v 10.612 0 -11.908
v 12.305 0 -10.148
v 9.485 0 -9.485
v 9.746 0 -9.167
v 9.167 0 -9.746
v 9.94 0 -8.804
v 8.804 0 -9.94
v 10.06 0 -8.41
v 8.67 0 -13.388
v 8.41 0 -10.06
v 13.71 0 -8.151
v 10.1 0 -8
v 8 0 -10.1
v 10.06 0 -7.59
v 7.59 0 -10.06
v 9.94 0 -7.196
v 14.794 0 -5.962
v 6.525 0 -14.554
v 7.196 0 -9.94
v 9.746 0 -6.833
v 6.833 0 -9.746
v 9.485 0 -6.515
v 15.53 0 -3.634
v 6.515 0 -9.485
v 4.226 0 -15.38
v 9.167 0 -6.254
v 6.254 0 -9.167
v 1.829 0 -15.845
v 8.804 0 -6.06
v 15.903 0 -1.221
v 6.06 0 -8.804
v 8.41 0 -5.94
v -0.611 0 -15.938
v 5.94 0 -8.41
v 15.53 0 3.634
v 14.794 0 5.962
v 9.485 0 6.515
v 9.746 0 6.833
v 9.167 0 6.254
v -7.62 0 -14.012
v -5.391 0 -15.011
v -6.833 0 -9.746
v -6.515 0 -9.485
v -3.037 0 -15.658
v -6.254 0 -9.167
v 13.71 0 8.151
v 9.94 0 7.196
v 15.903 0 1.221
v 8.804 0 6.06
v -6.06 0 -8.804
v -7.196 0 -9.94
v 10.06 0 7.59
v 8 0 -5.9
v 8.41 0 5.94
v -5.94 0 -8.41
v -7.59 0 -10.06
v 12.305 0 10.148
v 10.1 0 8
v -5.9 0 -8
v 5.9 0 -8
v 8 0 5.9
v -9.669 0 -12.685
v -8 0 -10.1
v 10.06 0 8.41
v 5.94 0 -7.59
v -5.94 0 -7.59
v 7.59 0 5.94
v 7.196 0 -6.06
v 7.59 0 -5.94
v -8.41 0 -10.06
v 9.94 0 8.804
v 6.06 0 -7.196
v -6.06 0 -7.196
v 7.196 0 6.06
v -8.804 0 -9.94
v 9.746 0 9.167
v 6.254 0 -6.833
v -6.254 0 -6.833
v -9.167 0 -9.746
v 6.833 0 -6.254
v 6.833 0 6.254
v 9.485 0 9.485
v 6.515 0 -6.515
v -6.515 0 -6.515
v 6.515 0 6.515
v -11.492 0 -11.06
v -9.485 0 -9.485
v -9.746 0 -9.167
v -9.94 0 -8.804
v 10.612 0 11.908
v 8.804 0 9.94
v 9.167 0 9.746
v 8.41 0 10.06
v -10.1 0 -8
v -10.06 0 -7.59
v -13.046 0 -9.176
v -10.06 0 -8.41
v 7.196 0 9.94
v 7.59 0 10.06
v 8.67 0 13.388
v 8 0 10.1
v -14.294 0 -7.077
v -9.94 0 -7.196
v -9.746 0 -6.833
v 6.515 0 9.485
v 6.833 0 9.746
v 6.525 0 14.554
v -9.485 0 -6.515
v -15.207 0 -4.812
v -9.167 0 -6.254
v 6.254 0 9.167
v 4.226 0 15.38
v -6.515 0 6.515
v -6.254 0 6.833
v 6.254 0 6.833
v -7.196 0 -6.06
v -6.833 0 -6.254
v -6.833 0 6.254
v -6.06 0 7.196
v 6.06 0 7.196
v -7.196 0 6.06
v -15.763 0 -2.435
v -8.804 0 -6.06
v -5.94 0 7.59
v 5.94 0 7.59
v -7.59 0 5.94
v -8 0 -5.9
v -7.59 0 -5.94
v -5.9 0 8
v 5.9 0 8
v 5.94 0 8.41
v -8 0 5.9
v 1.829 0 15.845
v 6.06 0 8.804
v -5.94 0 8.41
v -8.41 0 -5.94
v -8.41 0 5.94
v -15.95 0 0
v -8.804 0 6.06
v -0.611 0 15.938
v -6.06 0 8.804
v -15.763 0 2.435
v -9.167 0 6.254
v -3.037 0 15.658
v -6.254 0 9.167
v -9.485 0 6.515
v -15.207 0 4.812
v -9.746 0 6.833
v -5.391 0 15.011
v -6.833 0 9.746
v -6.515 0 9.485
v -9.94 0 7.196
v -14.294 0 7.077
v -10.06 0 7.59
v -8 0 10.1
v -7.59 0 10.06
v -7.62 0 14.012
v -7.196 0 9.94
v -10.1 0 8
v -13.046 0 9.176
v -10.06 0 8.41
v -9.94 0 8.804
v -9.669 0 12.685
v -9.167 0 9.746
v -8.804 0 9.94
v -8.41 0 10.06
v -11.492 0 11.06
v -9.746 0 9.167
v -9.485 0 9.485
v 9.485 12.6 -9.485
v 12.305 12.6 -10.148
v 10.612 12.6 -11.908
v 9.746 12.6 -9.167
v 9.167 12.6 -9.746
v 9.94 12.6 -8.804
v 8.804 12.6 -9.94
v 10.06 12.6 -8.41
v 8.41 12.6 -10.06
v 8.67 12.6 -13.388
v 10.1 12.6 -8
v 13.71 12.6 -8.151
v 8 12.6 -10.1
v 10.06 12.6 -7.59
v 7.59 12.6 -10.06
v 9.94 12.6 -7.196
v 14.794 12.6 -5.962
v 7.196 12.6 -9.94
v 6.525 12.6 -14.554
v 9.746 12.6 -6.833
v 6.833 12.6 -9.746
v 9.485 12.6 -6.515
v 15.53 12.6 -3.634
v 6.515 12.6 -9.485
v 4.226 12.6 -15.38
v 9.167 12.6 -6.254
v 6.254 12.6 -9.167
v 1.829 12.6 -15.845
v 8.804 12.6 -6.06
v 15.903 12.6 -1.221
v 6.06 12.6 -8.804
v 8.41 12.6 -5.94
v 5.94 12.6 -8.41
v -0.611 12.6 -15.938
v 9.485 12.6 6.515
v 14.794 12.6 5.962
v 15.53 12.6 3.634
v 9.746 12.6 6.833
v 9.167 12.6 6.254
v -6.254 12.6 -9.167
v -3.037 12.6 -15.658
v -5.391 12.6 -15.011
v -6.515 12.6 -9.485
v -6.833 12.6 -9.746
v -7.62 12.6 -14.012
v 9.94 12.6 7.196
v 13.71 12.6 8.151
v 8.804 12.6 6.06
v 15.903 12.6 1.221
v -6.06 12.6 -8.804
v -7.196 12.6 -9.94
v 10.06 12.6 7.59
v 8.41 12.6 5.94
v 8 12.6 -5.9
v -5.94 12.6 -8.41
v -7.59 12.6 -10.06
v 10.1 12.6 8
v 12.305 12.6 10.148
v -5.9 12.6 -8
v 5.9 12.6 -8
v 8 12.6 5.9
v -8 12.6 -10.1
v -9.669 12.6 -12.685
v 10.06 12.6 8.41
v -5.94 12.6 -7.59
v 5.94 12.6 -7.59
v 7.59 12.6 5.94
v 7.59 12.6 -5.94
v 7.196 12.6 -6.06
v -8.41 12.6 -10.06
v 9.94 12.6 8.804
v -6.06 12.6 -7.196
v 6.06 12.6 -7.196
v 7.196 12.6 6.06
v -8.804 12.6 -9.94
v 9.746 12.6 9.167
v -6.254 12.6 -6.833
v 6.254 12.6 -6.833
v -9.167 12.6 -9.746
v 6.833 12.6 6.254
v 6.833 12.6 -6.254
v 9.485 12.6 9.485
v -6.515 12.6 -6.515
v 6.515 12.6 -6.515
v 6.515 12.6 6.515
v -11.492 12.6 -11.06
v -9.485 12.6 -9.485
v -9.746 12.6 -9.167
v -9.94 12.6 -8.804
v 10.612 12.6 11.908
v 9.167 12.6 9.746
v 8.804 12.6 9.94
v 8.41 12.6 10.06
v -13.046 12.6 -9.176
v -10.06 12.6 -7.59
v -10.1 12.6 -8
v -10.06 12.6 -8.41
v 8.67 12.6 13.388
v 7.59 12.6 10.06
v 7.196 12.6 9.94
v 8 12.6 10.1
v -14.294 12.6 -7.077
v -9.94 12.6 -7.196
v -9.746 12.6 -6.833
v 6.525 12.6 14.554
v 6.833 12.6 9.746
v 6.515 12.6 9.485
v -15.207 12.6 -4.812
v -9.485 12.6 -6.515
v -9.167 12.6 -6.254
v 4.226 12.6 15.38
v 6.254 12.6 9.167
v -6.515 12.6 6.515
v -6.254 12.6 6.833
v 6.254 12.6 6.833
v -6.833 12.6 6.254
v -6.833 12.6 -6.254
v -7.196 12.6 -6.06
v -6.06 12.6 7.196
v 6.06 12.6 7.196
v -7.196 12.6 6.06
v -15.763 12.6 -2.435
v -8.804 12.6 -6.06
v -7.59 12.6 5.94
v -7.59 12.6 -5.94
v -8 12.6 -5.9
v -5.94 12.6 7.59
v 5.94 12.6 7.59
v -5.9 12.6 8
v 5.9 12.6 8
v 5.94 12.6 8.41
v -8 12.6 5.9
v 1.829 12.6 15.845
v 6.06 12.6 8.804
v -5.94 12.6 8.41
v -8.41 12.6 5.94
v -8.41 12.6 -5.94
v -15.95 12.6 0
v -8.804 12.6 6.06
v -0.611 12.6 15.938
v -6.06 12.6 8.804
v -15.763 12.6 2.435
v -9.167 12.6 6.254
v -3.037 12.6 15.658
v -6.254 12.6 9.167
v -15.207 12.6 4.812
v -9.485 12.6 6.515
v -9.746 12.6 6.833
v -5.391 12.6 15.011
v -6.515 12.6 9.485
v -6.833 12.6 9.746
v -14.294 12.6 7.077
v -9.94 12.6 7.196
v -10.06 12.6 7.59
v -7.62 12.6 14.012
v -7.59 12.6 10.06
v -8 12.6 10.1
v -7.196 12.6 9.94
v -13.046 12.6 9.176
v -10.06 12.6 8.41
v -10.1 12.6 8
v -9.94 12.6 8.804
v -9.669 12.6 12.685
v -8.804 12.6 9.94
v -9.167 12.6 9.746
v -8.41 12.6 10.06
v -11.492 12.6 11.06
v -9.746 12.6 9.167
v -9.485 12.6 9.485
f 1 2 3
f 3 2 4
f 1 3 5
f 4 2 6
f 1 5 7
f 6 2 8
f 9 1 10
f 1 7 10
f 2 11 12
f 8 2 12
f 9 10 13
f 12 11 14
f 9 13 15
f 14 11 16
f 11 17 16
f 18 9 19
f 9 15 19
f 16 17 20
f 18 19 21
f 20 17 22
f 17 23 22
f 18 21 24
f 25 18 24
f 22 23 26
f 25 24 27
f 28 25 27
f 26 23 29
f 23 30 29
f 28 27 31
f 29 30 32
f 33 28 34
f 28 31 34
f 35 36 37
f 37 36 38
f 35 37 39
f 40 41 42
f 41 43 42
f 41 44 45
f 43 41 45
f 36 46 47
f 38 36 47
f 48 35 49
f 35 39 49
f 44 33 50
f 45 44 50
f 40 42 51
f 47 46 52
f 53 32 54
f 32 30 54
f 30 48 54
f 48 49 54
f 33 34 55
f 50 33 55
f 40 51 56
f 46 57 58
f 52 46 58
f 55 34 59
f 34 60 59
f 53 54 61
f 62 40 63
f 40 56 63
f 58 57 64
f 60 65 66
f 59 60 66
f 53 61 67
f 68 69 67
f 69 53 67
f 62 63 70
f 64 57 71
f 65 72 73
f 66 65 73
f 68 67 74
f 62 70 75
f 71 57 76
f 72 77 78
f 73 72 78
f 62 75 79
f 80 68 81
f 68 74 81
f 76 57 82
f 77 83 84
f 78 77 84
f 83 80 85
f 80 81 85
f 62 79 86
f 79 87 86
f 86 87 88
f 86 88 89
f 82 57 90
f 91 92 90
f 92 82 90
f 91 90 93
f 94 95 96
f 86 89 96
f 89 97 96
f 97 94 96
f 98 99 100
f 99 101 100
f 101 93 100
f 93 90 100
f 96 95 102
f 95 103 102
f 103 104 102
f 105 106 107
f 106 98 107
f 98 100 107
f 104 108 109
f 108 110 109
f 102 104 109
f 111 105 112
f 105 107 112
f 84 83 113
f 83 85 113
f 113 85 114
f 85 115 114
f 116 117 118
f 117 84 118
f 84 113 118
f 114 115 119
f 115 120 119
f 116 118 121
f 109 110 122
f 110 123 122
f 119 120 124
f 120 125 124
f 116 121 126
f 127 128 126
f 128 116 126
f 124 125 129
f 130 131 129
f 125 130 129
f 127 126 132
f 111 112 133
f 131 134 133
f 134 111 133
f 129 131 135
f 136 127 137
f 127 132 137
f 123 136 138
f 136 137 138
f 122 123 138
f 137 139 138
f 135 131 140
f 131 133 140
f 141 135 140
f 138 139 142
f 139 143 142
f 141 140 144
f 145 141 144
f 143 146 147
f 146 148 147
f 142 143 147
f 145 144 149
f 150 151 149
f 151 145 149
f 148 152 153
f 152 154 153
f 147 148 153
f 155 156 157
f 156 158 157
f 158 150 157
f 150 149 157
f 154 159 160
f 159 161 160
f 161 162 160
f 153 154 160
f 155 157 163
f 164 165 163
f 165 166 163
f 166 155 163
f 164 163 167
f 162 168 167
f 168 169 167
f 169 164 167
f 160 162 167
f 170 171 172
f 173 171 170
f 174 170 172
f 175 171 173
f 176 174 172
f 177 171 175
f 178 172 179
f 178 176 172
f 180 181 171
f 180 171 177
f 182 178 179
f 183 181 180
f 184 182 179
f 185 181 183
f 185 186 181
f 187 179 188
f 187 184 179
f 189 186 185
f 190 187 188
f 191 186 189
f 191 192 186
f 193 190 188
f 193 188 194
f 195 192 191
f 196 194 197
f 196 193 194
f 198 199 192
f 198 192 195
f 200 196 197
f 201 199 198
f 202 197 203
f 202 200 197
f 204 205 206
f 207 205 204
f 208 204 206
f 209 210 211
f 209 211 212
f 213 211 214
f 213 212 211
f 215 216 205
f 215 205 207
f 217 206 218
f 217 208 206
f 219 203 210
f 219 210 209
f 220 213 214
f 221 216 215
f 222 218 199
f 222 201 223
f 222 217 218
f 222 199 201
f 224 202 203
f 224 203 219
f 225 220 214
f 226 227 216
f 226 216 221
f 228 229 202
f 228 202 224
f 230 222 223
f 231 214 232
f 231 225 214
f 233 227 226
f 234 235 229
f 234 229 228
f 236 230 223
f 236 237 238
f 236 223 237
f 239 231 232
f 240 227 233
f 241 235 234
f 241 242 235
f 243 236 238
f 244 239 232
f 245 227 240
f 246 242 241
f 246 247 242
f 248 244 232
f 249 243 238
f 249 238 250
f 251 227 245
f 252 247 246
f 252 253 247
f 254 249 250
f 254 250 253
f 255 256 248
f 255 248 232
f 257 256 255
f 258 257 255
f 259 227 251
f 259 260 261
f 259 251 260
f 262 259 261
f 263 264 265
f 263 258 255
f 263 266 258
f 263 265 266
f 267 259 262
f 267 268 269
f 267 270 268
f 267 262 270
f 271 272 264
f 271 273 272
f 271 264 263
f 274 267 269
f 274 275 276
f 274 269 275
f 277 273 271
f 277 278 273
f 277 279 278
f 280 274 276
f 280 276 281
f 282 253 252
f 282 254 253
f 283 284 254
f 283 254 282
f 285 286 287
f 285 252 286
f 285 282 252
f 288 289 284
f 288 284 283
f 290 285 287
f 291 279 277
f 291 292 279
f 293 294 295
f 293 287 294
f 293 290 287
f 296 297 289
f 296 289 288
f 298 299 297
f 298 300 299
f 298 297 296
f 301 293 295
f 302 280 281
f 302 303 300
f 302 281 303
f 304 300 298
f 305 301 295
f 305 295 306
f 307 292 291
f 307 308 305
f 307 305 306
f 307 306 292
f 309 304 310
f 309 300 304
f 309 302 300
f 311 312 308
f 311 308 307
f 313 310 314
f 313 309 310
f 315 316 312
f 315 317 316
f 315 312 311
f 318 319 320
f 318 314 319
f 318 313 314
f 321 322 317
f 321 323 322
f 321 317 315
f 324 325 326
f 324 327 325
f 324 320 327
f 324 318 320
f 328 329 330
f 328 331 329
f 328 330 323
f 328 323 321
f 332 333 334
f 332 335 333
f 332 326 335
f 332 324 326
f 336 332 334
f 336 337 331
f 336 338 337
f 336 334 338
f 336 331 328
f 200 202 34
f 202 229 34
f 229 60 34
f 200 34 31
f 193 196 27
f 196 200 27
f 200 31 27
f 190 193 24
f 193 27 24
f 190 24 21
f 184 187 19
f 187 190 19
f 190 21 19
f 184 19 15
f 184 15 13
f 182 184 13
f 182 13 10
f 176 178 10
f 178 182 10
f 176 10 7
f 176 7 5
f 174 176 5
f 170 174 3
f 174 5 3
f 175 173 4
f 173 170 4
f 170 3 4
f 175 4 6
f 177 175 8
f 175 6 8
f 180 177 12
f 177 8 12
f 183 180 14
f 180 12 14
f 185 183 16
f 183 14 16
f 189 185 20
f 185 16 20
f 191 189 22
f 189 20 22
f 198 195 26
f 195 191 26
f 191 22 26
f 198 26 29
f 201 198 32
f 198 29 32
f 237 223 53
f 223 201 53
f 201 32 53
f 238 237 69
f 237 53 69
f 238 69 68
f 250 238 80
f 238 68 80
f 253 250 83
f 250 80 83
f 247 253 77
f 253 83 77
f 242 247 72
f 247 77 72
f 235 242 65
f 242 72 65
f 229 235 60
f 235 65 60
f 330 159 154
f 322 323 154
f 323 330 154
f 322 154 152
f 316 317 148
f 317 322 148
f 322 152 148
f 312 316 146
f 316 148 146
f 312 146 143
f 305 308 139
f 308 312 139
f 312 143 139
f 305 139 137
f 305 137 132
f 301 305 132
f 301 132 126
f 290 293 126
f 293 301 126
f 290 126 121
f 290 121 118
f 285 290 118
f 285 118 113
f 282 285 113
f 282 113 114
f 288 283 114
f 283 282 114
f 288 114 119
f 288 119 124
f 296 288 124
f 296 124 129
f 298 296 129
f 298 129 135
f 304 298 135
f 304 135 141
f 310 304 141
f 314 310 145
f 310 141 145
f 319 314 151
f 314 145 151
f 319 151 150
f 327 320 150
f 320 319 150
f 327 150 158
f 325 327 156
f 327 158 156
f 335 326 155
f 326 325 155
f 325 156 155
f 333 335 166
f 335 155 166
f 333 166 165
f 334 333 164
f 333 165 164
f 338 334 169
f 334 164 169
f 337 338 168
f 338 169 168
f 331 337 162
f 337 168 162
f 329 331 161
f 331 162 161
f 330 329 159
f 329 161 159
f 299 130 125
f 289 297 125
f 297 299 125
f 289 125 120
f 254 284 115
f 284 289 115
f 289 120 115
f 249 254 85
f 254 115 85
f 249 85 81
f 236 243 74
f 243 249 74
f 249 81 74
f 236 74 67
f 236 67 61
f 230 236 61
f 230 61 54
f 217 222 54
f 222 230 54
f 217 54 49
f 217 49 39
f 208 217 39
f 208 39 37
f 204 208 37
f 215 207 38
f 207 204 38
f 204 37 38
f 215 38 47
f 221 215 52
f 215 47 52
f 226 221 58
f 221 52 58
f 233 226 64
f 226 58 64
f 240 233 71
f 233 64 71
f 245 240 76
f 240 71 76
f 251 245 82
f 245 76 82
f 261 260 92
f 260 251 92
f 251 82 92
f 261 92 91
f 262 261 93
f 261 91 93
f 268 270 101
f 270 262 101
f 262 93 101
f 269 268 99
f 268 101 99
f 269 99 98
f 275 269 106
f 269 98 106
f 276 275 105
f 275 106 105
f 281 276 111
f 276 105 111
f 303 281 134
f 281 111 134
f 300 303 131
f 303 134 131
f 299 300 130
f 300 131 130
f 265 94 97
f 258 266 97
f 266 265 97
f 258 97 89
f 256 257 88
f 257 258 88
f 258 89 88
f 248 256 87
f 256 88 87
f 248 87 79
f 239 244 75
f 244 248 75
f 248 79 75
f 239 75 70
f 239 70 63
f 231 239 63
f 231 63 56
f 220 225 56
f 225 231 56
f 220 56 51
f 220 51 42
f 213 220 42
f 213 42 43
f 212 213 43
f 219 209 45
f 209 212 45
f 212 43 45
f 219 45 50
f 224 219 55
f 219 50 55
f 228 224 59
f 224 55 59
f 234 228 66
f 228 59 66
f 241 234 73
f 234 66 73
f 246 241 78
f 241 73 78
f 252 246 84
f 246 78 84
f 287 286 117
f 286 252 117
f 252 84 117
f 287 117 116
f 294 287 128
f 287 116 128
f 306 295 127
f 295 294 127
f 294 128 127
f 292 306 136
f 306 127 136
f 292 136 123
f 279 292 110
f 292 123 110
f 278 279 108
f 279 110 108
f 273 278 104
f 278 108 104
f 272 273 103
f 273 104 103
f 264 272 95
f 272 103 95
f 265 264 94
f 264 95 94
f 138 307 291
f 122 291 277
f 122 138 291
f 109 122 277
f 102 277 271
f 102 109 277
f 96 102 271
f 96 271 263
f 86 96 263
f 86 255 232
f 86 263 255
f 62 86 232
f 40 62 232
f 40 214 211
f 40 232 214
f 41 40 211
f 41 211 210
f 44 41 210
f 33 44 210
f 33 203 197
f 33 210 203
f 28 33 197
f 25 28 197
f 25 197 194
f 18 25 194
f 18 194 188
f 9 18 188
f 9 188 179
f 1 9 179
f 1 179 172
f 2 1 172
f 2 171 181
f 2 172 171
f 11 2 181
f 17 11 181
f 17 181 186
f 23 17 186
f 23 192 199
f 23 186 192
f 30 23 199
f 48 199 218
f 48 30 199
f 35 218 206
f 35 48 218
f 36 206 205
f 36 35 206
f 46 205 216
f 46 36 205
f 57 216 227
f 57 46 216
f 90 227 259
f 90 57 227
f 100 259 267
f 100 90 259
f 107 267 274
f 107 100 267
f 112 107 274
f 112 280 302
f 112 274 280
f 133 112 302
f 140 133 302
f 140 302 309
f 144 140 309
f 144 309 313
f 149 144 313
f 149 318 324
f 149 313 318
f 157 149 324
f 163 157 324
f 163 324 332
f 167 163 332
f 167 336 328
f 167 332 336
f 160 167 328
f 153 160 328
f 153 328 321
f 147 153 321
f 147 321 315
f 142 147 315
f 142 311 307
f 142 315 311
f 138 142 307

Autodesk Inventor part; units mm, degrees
ref_plane "YZ Plane" through (0, 0, 0) normal (1, 0, 0) x (0, 1, 0)
ref_plane "XZ Plane" through (0, 0, 0) normal (0, 1, 0) x (-1, 0, 0)
ref_plane "XY Plane" through (0, 0, 0) normal (0, 0, 1) x (1, 0, 0)
sketch "Sketch1" plane through (0, 0, 0) normal (0, 1, 0) x (-1, 0, 0)
  circle A0 centre (0, 0) radius 15.95
  circle A1 centre (8, 8) radius 2.1
  circle A2 centre (-8, 8) radius 2.1
  circle A3 centre (-8, -8) radius 2.1
  circle A4 centre (8, -8) radius 2.1
  dimension "d0" = 31.9
  dimension "d1" = 4.2
  dimension "d2" = 8
  dimension "d3" = 8
  dimension "d6" = 360
extrude "Extrusion1" add sketch "Sketch1" along normal blind 12.6
properties part number "EndEffector_Stage1BearingSpacer" material "Aluminum 6061"
